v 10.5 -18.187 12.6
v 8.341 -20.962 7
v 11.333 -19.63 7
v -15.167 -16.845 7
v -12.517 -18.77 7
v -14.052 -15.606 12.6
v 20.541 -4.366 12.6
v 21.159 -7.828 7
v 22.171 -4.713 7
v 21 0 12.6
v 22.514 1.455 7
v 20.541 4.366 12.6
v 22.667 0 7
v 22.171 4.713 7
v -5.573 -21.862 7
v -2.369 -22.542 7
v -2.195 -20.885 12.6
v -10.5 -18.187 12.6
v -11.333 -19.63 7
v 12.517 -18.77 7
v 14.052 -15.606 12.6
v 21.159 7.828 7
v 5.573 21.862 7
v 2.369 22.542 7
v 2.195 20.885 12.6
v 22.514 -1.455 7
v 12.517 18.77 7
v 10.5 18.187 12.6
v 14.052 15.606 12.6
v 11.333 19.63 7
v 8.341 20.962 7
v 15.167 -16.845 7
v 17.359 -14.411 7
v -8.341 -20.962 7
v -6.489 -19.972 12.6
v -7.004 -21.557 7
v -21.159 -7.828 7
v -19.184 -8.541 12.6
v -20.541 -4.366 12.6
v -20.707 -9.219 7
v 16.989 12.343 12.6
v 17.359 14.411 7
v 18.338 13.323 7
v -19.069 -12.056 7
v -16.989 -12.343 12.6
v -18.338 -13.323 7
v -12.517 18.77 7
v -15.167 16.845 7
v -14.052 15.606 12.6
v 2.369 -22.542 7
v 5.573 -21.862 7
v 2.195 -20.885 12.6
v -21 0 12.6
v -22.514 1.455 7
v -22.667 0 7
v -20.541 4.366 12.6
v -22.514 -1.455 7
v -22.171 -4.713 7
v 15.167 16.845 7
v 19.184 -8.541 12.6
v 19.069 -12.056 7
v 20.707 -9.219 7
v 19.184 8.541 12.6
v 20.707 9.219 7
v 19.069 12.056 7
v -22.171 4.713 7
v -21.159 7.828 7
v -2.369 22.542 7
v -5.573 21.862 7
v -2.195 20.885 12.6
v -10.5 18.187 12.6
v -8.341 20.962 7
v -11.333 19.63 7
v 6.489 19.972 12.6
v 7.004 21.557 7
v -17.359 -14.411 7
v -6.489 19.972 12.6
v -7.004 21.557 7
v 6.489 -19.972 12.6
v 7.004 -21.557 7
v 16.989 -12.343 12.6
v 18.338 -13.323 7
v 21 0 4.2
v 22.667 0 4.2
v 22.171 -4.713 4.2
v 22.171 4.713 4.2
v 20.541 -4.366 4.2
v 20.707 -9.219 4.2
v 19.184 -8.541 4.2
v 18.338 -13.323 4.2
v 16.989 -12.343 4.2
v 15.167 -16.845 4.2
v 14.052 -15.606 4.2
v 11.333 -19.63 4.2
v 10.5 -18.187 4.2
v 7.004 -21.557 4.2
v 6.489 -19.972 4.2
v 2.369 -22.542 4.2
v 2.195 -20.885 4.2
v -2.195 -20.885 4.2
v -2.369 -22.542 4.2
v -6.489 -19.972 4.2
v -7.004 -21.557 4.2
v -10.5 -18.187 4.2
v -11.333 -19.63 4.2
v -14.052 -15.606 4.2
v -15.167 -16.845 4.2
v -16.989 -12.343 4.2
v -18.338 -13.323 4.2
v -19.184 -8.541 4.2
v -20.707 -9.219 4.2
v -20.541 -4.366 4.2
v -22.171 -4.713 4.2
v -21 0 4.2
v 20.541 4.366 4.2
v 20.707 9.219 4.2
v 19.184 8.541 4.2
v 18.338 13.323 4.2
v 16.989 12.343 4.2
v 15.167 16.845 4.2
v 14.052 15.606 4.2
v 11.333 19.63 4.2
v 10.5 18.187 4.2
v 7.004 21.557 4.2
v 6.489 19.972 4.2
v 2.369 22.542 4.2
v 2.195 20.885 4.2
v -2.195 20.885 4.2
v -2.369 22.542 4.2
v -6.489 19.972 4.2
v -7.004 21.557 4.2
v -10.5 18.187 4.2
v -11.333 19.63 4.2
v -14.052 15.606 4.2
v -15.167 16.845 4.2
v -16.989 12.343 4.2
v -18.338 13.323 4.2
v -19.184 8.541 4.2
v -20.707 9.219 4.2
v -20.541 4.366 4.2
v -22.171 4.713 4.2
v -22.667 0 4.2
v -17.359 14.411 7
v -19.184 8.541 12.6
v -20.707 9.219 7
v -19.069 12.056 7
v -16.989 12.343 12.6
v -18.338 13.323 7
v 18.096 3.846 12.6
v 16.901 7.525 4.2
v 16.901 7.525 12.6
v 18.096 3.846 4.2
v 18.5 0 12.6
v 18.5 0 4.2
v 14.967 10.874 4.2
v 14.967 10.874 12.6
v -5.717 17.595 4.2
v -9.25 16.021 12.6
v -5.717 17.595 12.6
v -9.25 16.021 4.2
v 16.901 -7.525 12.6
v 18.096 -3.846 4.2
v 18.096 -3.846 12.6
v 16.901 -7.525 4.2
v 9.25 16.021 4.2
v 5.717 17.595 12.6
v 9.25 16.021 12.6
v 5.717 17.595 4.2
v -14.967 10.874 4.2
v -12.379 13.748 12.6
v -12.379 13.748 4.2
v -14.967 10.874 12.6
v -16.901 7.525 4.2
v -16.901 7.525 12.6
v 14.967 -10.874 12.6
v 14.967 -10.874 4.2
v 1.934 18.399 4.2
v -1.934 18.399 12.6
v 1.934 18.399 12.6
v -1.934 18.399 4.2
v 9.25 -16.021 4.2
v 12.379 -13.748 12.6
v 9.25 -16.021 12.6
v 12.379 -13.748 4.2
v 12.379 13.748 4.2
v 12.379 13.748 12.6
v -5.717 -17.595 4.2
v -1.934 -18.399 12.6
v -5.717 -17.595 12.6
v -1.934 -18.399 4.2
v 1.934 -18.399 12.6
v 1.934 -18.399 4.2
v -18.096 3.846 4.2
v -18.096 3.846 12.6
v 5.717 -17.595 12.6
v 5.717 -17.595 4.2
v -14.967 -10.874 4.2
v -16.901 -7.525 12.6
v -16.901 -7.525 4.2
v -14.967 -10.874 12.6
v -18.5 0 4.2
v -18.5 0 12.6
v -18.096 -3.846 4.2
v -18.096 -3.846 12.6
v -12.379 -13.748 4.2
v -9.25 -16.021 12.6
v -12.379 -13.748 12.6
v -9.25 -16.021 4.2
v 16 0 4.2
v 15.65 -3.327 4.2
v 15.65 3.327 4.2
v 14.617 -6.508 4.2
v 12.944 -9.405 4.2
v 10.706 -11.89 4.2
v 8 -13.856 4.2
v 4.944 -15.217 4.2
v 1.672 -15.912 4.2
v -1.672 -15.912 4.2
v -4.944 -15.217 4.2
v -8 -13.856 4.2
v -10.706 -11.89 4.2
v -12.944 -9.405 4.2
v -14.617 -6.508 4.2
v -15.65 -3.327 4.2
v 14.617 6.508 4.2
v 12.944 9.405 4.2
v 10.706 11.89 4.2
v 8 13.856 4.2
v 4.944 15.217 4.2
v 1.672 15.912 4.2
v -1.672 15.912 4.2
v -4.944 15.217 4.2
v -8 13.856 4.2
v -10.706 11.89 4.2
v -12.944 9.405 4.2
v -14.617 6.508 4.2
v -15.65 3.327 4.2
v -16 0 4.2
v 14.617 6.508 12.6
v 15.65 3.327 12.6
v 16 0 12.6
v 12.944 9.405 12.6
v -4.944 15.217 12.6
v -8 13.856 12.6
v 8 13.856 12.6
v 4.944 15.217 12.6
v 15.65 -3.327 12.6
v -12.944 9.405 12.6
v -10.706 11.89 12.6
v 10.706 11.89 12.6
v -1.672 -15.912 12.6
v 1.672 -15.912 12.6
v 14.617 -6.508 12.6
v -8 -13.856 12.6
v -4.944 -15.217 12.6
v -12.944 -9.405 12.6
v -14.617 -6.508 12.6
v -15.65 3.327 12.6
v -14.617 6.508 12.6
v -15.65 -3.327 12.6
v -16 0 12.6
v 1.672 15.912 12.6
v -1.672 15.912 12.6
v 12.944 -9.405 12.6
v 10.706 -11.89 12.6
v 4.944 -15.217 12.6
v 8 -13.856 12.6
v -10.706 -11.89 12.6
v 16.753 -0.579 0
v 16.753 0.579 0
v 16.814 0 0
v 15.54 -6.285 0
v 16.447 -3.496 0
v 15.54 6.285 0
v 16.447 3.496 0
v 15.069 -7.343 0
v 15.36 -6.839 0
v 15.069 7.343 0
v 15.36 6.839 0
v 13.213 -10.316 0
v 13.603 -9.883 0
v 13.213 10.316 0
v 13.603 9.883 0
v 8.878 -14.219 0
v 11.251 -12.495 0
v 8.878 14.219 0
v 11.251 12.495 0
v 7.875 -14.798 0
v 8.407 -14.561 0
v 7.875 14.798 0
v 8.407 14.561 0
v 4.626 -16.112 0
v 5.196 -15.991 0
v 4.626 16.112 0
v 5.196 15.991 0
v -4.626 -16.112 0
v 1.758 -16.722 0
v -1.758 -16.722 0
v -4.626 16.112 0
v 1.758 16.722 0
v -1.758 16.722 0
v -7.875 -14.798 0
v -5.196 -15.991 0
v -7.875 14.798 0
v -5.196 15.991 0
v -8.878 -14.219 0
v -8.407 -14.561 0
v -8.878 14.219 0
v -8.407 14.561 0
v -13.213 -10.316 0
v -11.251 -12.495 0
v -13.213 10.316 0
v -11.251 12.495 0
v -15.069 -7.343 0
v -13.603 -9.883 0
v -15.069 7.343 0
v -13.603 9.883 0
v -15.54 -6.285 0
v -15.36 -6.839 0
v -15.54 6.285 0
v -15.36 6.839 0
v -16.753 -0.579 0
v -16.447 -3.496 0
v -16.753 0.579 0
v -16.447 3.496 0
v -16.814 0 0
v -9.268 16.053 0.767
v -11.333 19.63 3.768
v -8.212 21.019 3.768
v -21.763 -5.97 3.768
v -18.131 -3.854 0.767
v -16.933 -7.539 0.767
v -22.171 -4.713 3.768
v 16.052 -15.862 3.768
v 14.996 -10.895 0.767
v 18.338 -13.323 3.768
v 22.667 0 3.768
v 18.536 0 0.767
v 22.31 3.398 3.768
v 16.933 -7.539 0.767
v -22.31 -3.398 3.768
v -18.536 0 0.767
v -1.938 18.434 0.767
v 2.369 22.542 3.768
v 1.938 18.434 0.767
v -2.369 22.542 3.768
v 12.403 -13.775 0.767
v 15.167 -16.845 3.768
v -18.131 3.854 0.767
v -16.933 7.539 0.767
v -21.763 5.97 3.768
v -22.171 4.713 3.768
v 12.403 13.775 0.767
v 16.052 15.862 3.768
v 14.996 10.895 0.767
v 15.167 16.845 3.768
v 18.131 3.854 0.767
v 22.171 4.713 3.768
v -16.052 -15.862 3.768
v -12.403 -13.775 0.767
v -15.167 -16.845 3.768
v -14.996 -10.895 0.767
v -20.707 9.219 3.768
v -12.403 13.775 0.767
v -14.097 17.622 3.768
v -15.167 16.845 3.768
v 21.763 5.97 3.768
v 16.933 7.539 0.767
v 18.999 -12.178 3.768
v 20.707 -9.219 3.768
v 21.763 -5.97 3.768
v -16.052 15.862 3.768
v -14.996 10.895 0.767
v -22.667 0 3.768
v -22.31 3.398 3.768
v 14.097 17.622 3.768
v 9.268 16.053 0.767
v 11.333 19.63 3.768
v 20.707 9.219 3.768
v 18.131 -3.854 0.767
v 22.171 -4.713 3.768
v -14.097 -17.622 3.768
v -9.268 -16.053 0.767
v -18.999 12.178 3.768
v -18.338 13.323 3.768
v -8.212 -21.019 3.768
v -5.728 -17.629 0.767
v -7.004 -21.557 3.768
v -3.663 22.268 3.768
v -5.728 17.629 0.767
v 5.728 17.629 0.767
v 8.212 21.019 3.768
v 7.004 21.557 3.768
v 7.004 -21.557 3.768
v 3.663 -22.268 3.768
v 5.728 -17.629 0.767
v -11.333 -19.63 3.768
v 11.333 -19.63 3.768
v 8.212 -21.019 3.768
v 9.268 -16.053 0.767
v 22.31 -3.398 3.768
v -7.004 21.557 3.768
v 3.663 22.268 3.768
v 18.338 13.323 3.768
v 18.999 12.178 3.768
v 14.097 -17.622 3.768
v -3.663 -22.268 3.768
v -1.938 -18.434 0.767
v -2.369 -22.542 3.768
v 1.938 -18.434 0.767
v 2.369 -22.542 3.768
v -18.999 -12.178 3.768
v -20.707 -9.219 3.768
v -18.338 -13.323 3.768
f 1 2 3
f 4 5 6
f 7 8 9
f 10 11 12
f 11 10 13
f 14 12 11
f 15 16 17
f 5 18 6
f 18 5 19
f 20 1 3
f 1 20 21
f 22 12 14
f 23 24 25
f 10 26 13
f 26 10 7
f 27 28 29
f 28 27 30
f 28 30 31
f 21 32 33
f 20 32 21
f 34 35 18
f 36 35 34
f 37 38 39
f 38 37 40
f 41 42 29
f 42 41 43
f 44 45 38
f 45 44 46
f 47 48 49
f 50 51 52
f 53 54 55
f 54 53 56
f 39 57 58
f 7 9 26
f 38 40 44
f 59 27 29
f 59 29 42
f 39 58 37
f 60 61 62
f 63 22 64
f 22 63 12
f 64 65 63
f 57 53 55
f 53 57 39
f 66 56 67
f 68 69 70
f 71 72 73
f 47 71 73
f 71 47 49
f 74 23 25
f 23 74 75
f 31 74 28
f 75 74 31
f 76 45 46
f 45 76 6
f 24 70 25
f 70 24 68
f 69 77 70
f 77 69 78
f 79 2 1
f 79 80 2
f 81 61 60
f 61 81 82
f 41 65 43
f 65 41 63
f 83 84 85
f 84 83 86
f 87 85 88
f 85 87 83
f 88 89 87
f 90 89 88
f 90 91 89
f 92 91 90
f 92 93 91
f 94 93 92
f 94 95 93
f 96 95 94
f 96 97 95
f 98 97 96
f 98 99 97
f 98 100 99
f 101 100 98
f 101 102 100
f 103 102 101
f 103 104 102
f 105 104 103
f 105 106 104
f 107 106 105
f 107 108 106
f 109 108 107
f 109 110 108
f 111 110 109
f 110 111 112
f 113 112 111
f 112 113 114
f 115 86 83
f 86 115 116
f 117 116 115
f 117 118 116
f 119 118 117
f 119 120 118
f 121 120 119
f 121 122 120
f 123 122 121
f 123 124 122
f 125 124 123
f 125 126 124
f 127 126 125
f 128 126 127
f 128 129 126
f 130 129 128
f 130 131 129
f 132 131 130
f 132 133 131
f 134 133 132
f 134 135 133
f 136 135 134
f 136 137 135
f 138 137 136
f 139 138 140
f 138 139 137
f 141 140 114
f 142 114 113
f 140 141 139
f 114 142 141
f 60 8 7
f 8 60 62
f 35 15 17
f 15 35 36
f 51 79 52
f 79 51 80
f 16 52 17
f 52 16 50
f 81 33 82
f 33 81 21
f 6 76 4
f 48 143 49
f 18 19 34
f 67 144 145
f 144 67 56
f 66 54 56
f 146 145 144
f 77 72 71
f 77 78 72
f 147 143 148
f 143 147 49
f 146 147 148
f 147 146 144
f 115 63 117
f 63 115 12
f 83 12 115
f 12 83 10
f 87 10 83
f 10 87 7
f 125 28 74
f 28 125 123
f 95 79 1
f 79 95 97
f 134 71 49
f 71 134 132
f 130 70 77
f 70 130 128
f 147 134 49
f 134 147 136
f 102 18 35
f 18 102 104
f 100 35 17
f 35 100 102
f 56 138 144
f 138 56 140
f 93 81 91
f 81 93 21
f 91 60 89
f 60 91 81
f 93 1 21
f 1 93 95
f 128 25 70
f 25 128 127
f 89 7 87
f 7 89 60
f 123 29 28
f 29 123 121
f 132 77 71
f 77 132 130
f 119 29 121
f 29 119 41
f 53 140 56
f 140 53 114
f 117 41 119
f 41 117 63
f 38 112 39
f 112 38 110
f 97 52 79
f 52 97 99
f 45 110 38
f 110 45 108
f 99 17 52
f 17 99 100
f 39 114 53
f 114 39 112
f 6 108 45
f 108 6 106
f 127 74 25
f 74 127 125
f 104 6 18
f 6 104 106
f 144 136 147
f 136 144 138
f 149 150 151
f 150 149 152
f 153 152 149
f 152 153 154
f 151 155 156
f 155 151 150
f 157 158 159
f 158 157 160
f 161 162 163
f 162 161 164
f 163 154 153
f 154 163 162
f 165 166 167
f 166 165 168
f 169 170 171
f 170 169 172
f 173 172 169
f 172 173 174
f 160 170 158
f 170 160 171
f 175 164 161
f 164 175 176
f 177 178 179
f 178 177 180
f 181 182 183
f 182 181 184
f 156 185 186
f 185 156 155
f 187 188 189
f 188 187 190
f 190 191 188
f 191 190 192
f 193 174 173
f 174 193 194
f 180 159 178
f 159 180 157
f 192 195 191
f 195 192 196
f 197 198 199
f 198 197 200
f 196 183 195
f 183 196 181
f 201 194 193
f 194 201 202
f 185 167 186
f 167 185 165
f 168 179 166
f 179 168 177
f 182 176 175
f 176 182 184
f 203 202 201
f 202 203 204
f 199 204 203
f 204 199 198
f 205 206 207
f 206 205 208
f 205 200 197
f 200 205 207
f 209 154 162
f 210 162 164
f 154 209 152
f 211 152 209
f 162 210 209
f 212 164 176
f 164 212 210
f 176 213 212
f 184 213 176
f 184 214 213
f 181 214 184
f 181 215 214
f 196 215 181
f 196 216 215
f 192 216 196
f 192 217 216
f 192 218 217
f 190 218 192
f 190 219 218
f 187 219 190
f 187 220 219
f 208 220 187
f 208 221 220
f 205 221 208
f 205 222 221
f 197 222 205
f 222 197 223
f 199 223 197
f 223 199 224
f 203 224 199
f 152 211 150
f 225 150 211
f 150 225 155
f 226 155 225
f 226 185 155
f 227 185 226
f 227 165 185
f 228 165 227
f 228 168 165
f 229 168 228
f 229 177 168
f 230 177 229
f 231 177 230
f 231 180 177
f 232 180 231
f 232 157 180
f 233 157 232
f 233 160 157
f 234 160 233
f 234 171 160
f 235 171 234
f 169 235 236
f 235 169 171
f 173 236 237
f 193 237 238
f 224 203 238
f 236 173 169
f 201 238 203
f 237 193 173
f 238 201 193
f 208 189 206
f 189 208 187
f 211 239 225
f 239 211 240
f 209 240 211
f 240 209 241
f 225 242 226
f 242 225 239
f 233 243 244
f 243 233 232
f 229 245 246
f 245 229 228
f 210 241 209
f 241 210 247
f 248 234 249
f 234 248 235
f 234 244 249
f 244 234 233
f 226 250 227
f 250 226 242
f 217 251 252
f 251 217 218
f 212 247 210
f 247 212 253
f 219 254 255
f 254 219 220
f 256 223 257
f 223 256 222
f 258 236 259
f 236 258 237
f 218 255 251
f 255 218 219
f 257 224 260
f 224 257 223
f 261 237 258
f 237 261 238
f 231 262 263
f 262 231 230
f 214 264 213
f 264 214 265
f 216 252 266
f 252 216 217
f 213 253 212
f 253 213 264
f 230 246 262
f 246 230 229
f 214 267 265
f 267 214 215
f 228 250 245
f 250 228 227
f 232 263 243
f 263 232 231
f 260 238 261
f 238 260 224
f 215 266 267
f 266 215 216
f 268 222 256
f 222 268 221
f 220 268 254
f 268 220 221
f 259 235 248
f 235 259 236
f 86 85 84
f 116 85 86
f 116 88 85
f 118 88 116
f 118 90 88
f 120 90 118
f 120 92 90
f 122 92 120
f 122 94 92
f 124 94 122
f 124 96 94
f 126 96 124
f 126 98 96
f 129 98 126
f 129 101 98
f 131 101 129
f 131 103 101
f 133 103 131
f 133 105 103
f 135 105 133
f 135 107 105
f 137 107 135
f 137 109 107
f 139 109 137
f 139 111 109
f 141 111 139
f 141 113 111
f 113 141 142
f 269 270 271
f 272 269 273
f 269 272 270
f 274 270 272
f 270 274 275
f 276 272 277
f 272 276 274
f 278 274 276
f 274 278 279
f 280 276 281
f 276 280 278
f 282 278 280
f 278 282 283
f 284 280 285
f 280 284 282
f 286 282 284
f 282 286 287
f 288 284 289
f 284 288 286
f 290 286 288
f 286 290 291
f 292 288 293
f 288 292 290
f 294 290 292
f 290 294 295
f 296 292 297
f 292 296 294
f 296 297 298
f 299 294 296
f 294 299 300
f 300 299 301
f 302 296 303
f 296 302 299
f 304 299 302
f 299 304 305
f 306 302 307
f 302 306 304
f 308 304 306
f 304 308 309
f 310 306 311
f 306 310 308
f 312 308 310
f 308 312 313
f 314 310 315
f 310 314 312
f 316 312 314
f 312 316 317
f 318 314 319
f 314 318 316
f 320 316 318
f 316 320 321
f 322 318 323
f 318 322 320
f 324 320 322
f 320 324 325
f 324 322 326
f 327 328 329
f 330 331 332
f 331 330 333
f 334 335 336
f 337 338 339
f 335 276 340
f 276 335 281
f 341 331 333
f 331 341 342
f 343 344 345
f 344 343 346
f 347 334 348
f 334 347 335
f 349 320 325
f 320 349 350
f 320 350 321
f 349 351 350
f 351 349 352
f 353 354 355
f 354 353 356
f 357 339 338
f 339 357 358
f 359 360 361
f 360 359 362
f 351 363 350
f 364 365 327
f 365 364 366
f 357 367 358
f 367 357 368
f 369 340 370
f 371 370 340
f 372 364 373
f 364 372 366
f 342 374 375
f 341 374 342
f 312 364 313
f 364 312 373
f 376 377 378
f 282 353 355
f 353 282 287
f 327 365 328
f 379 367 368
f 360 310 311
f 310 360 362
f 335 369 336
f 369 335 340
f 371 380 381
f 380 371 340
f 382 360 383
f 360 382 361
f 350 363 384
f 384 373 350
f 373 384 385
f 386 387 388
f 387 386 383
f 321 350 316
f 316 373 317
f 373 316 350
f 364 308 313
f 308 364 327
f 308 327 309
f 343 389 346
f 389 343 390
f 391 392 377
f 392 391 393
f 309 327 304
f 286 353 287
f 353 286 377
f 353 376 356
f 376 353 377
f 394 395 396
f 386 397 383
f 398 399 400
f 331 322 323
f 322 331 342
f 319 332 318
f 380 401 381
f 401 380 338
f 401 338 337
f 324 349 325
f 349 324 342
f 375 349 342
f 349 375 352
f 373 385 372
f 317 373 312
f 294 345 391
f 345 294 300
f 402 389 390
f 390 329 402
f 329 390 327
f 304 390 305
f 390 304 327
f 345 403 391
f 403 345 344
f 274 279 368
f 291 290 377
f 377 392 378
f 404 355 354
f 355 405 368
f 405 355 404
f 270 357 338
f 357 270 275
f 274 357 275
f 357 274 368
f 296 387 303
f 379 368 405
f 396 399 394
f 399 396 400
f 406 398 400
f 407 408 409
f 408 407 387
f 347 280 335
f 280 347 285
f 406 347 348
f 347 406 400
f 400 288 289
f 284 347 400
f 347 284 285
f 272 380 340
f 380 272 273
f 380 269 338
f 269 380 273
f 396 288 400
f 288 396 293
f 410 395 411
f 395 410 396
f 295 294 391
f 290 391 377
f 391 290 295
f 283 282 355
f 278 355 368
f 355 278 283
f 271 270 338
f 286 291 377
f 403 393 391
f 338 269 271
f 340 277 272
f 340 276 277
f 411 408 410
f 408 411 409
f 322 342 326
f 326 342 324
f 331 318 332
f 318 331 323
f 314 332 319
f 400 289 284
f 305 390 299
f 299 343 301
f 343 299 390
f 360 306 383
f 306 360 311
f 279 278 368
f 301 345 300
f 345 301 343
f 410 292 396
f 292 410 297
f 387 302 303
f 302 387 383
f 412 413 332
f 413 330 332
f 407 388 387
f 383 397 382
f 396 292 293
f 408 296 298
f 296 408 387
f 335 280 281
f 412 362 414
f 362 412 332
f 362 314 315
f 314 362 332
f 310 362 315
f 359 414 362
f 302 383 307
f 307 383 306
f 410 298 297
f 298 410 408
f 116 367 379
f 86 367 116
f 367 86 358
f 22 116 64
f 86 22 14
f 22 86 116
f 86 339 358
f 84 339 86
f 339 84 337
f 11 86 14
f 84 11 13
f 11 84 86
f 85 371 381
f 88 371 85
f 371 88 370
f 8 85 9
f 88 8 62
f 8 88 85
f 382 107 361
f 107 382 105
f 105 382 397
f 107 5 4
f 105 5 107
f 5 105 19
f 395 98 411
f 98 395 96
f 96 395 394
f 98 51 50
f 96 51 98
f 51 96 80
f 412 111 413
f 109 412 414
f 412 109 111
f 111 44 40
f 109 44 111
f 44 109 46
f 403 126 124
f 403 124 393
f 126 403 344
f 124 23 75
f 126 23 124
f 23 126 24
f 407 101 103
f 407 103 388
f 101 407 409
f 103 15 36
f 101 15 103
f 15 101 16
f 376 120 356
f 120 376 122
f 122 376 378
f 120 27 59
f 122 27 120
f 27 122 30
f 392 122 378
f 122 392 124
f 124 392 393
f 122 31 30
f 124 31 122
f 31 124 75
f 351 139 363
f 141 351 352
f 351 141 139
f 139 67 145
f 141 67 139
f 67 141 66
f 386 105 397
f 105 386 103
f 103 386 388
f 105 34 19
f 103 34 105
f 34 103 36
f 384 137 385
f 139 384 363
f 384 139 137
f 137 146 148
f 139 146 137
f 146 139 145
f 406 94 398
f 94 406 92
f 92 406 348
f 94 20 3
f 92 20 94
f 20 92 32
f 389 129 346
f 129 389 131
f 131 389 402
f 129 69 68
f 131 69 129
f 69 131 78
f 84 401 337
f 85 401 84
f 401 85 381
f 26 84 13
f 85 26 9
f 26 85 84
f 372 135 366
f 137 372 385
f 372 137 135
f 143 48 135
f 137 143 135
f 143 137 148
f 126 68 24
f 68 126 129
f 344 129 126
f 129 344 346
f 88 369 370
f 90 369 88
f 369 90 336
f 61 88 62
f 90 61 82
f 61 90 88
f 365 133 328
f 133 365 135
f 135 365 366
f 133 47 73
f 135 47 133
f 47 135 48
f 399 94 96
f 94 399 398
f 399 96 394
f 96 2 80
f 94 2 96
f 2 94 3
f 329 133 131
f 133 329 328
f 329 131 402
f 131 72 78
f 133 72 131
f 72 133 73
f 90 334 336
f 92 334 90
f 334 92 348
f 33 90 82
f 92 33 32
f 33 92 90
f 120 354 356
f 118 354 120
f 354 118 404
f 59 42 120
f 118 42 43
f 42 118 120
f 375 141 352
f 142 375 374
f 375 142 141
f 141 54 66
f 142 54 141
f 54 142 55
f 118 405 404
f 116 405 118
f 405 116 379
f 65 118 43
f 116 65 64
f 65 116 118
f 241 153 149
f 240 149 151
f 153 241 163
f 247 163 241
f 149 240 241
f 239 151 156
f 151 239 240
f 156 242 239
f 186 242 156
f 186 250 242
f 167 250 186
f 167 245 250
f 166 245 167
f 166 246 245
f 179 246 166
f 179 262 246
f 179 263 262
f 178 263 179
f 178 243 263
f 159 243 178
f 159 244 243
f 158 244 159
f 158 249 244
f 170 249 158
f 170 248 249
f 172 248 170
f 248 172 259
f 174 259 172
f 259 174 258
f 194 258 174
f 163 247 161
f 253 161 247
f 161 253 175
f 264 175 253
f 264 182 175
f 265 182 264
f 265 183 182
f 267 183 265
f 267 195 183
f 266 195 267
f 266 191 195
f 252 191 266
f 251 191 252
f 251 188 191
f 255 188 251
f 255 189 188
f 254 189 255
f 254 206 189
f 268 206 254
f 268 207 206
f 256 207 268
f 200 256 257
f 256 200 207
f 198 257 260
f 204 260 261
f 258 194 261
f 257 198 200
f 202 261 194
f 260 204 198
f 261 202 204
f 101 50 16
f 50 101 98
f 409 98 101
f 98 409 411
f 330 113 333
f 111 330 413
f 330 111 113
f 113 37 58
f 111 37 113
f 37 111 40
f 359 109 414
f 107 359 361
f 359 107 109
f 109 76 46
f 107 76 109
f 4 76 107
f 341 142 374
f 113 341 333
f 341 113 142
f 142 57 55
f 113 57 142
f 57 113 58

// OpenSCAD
outside_diameter = 42 ;	// [20:100]
inside_diameter = 37 ;	// [18:98]

module EndCap(id, od) {
    walls = od - id ;
    depth = .2 * od ;
    height = depth / 2 ;
    r = (pow(2 * height, 2) + pow((od + walls) / 2, 2)) / (4 * height) ;

    intersection() {
        union() {
            cylinder(h=height, r=(od + walls) / 2);
            translate([0, 0, height]) {
                difference() {
                    cylinder(h=depth, r1=(od + walls) / 2, r2=od / 2) ;
                    translate([0, 0, -1])
                        cylinder(h=depth + 2, r=od / 2) ;
                }
                difference() {
                    cylinder(h=depth, r=id/2) ;
                    translate([0, 0, -1])
                        cylinder(h=depth + 2, r=(id - walls) / 2) ;
                }
            }
        }
        translate([0, 0, r - height]) sphere(r) ;
        cylinder(h=depth + height, r=(od + 2 * walls / 3) / 2) ;
    }
}

EndCap(inside_diameter, outside_diameter) ;
